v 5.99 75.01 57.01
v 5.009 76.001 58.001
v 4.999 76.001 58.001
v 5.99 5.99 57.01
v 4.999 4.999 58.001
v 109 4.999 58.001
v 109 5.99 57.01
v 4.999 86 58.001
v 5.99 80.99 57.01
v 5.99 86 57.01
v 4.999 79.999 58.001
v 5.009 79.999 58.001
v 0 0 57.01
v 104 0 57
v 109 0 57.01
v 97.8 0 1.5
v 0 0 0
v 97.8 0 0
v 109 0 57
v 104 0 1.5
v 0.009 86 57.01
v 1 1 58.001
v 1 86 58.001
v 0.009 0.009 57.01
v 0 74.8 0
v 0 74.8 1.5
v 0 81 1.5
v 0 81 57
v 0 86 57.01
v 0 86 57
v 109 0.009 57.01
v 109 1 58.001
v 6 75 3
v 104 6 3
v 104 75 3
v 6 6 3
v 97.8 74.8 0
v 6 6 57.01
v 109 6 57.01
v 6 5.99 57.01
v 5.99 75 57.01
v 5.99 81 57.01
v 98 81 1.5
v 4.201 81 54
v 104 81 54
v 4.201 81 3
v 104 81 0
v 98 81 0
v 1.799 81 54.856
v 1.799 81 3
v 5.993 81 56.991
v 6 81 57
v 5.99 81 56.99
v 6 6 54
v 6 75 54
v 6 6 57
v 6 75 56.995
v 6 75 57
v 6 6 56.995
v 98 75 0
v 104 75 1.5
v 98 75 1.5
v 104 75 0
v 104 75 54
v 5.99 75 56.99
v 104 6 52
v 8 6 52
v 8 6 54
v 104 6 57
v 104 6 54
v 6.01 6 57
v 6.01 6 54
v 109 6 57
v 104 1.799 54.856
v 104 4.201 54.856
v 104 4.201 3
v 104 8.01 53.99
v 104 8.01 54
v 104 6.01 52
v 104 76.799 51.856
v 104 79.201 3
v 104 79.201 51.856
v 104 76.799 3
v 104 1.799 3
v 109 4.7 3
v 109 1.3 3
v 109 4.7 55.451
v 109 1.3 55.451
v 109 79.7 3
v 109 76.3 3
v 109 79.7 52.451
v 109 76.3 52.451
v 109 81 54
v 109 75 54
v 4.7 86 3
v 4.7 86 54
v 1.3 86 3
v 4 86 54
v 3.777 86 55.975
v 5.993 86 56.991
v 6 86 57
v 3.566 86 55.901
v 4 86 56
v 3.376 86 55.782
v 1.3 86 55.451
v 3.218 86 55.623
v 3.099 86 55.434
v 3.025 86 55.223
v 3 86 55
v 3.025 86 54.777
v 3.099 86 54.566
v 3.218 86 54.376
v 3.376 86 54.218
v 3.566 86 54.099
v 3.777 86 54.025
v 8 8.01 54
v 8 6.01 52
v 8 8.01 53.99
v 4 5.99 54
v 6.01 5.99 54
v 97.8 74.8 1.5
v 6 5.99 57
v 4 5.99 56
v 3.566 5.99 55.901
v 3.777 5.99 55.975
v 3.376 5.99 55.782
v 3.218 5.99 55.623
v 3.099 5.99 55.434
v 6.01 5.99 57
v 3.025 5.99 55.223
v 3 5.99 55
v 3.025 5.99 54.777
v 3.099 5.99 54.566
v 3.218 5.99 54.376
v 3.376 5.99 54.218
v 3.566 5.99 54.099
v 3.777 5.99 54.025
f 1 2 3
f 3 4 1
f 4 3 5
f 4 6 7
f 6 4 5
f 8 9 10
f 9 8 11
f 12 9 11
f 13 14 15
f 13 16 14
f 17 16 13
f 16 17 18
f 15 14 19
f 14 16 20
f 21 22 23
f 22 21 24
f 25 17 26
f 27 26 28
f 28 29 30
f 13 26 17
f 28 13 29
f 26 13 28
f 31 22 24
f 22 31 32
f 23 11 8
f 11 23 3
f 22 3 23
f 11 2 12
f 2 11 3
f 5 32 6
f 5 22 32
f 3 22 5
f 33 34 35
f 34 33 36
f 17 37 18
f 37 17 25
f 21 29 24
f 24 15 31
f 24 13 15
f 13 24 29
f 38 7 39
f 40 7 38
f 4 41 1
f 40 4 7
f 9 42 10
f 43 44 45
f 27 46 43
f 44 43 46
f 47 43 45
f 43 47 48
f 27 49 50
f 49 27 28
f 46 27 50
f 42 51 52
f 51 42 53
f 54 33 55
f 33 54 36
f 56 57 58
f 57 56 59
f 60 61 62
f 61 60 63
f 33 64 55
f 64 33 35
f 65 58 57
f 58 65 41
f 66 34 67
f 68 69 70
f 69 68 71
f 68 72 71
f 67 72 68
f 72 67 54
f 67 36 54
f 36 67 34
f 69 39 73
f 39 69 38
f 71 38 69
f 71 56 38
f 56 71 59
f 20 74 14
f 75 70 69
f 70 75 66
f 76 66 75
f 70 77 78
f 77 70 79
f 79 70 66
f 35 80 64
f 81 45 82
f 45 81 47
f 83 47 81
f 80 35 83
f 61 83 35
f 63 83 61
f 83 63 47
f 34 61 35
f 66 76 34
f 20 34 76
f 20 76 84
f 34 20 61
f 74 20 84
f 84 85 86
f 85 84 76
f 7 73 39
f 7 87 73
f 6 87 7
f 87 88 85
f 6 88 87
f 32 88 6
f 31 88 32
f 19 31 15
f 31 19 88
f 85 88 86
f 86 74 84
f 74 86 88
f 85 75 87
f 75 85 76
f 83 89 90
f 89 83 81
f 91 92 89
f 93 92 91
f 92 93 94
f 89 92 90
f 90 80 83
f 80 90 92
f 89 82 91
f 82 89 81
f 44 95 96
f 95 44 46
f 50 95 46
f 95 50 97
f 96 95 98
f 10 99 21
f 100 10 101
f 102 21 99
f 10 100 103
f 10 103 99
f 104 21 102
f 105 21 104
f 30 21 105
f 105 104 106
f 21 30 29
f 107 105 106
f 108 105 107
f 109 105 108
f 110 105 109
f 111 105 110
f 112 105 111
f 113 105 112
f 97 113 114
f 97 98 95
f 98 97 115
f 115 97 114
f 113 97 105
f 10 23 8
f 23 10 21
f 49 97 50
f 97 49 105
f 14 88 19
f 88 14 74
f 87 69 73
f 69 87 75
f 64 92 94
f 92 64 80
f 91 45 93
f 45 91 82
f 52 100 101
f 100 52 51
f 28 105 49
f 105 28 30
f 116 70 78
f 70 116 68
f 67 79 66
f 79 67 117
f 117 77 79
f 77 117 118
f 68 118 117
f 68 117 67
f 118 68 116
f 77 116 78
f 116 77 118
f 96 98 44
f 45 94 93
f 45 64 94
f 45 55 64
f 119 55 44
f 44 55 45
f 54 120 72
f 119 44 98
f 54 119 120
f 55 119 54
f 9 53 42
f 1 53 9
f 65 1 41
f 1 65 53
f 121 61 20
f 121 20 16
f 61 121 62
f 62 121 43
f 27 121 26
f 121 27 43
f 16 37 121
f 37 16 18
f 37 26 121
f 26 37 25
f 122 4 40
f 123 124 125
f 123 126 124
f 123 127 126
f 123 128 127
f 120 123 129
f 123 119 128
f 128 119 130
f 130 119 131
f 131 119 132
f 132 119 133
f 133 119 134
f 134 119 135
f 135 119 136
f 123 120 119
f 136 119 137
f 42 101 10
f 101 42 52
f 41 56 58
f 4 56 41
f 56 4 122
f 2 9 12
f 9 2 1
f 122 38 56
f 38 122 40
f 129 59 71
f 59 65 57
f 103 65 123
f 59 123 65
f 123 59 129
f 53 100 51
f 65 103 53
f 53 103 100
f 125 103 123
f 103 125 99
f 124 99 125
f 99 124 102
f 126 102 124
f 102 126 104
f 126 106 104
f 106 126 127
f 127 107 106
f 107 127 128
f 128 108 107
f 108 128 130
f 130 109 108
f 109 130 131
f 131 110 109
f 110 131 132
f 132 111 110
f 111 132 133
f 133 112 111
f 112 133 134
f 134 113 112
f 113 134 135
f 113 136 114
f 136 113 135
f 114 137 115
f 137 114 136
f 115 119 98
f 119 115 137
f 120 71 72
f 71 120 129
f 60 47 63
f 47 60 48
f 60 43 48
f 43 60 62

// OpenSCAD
// ============================================================================
// cutlery_box.scad
// Graduated 3-chamber disposable-cutlery box (Option 3) — CUT-FROM-SOLID port
// of build_box.py, for a 120 x 120 x 120 mm printer (AOSEED).
//
// WHY THIS PORT EXISTS (the whole point):
//   The hand-mesh generator (build_box.py) could not keep the 1 mm rim chamfer
//   continuous across the female dovetail joints, because where a slot's flared
//   corner crosses the sloped chamfer it needs a true boolean intersection.
//   OpenSCAD HAS that boolean kernel, so here we do exactly the "cut-from-solid"
//   thing:
//      1. Build the ENTIRE box as ONE solid, WITH the chamfer already on it.
//      2. difference() out vertical dovetail prisms ( /_\ cross-section ),
//         running from just above the base plate up THROUGH the rim, to both
//         (a) form the sliding-dovetail joints, and
//         (b) split the box into 6 bed-sized pieces.
//   Because the cut is a real boolean through the already-chamfered solid, the
//   sloped chamfer<->slot edge is produced for free => the rim chamfer stays
//   CONTINUOUS across every joint, with none of the sliver hacks.
//
// ----------------------------------------------------------------------------
// HOW TO USE
//   In the app:  set `part` below (or use the Customizer dropdown), F5 to
//                preview, F6 to render, then File > Export > STL.
//   One piece (CLI):
//      openscad -o body_knife_A.stl -D 'part="knife_A"' cutlery_box.scad
//   ALL SIX (bash, run from this folder):
//      for p in knife_A knife_B fork_A fork_B spoon_A spoon_B; do \
//        openscad -o "body_$p.stl" -D "part=\"$p\"" cutlery_box.scad ; done
//   PNG preview of one piece:
//      openscad -o knife_B.png --imgsize=1400,1000 --autocenter --viewall \
//        -D 'part="knife_B"' cutlery_box.scad
//
//   Pieces are modelled in ASSEMBLED coordinates (floor-down, z=0 is the bed),
//   so importing all six STLs together shows the assembled box directly; your
//   slicer will auto-drop each one onto the plate for printing.
//
// BED SANITY: every piece is <= 120 mm in X, Y, Z.
//   Z = 58 mm. Widest piece = spoon at 117 mm (Y). A-halves reach 109 mm (X,
//   including the protruding dovetail key). All under 120.
//
// !! I could NOT run OpenSCAD to verify this file (no binary in my sandbox) !!
//   - The rim chamfer is a SMOOTH, true-45 bevel built from hull() frustums of
//     convex rectangles. Works in every OpenSCAD since ~2015 (incl. Homebrew
//     2021.01). No stepped staircase -- and, crucially, it makes box() a clean
//     well-formed solid so the per-part booleans resolve reliably (the old
//     14-slice staircase was fragile and CGAL was dropping the walls of the
//     interior parts, leaving only the key prisms => "floating boxes").
//   - roof() is still available behind USE_ROOF=true for those who have it
//     (2021.01+ snapshots); for THIS rectangular design it is identical, so it
//     is NOT required.
//   - After F6, check the console for "WARNING"/"not a valid 2-manifold".
//     If a tenon ever looks detached, bump EPS to 0.05.
// ============================================================================


/* [Part to render / export] */
part = "knife_A"; // [knife_A, knife_B, fork_A, fork_B, spoon_A, spoon_B, assembly]

/* [Chamfer method] */
// false = smooth hull() frustum bevel (default, any OpenSCAD); true = roof() (2021.01+)
USE_ROOF = false;

/* [Heights (mm)] */
BASE   = 3.0;     // floor / base-plate thickness
COMP_H = 55.0;    // interior wall height above the floor (cutlery stack depth)

/* [Walls (mm)] */
HOST_T   = 6.0;     // thickness of every wall (thick enough to host a dovetail)
HALF_LEN = 104.0;   // printed length of each half (A = near, B = far); <120 incl. key

/* [Chamber bays (mm)] */
N_COL     = 3;       // columns of cutlery per chamber
KNIFE_COL = 23.0;    // -> knife bay 69  (3 x 19 mm knives + play)
FORK_COL  = 33.0;    // -> fork  bay 99  (3 x 29 mm forks  + play)
SPOON_COL = 37.0;    // -> spoon bay 111 (3 x 34 mm spoons + play, trimmed <120)

/* [Dovetail joint (mm)] */
// TRIAL-PRINT FIX (Option A): the first print left the FEMALE ears only
//   ear = HOST_T/2 - (DT_FLARE + DT_CLR) = 3 - (2.1 + 0.4) = 0.5 mm  -> floppy,
//   the tail wiggled out, and the 0.5 mm outer skin showed the joint from outside.
// We CANNOT thicken the wall past 6 mm (no inner boss), so instead we shrink the
//   tail and spend the generous slide play to DOUBLE the ears, staying inside 6 mm:
//   ear = HOST_T/2 - (DT_FLARE + DT_CLR) = 3 - (1.7 + 0.3) = 1.0 mm.
//   Cost: shallower undercut hook (DT_FLARE-DT_NECK) 0.9 -> 0.5 mm. Acceptable for a
//   VERTICAL sliding dovetail (hold comes mostly from the 55 mm slide length + snug
//   fit, not a deep hook). Male tail neck (DT_NECK) is UNCHANGED, so the male keeps
//   its strength.
DT_DEPTH = 5.0;   // tail protrusion past the seam (male key depth)
DT_NECK  = 1.2;   // half-width at the seam face (narrow)   [Option A: unchanged]
DT_FLARE = 1.7;   // half-width at the tip (wide -> locks)  [Option A: was 2.1]
DT_CLR   = 0.3;   // FLANK/seam slide clearance added to the female socket [Option A: was 0.4]
DT_DEPTH_RELIEF = 0.3; // extra depth on the socket BACK only, so the tail tip never bottoms out
// ---- FUTURE TRIAL — Option B (thicker ears still: 1.2 mm) -------------------------
// If Option A's ears still feel thin, try Option B. It buys another 0.2 mm of ear by
// also narrowing the MALE neck (so the male gets a little weaker — that's the trade):
//     DT_NECK  = 1.0;   // was 1.2  (male neck 2.4 -> 2.0 mm full width)
//     DT_FLARE = 1.5;   // was 2.1
//     DT_CLR   = 0.3;   // same as Option A
//   -> ear = 3 - (1.5 + 0.3) = 1.2 mm ; undercut hook = 1.5 - 1.0 = 0.5 mm (same as A).
// Only switch ONE option in at a time; re-test the knife pair before committing all six.
// ----------------------------------------------------------------------------------

/* [Hidden-dovetail top cap / "hat" (mm)] */
// The dovetail otherwise shows its trapezoid outline on the TOP edge of the wall.
// To hide it, the MALE piece extends the wall's full-width top (chamfer included)
// across the key footprint -> a flush, continuous top. The FEMALE piece gets a
// matching top RECESS (cap footprint + CAP_CLR) so the cap drops straight in.
// Result: the top reads as one surface with a single straight seam line at the cap
// tip; the dovetail joinery lives entirely below the cap.
//
// SELF-SUPPORTING UNDERSIDE: the cap reaches the FULL wall width at the chamfer base
// (so the top edge reads as the wall extended, with NO recessed sliver on the outer
// face), and its underside is ONE planar ramp from the chamfer's OUTER CORNER
// (half-width HOST_T/2 at z = BODY_H-CHAMFER) down to the dovetail-neck half-width
// (CAP_FOOT) at CAP_SLANT_DEG from horizontal. No little horizontal step. The ramp
// reaching full width exactly at the chamfer base means "ramp top" == "chamfer base"
// (CAP_H is DERIVED). The FEMALE recess is the same ramp + CAP_CLR play.
// TRADEOFF: because the cap runs all the way to the outer corner, the female wall
// tapers to ~0 at z = BODY_H-CHAMFER -> a thin feather edge at the joint (gradual at
// CAP_SLANT_DEG, hidden inside the joint when assembled). Accepted per design intent.
CAP_SLANT_DEG = 50;     // cap underside ramp angle from horizontal (50 = self-supporting, long flare)
CAP_FOOT = DT_NECK;     // cap-underside half-width where it meets the dovetail neck
CAP_CLR = 0.3;          // slide clearance so the male cap seats into the female top recess

/* [Rim chamfer (mm)] */
CHAMFER = 1.0;    // 45-deg comfort break broken along the top wall edges

/* [Base half-lap / anti-warp (mm)] */
// Neighbouring base plates overlap as a HORIZONTAL half-lap (shiplap) at mid-base
// height, so corners stay coplanar (no lift/protrusion). Horizontal lap faces do
// NOT bind the vertical-drop assembly. Shingle direction: A->B and knife->fork->spoon.
LAP_LEN = 6;        // overlap past the A/B seam and the knife/fork seam
LAP_LEN_FS = 2;     // overlap past the fork/SPOON seam -- SMALLER: spoon is the
                    // tightest piece (117mm of the 120mm bed); a 6mm lap there
                    // would push spoon to 123mm. 2mm keeps spoon at 119mm.
LAP_Z   = BASE/2;   // 1.5 -- horizontal split height of the lap (bottom vs top half)
LAP_CLR = 0.2;      // in-plane clearance so the shelf isn't a press fit

/* [Lid — box features that receive a flat ORDERED clear sheet] */
// The lid itself is NOT printed: it's a flat ~2 mm PETG/Tritan sheet, bullnose-polished
// edges (r=LID_EDGE_R), ordered to size. We only model the box features that receive it.
LID_T            = 2.0;   // ordered sheet thickness
LID_EDGE_R       = 1.0;   // ordered sheet bullnose edge radius (for the sheet order spec)
LID_PLAY         = 0.4;   // total vertical play in the hinge groove (sheet + this)
LID_RECESS       = 2.0;   // lid TOP sits this far BELOW the rim, so the journal pocket is fully
                          // capped (rim caps the bullnose -> retains the lid when raised; tilt-in)
HINGE_AT_MINUS_X = true;  // hinge on the -x (303mm) end wall; clip on +x. (flip = mirror; default delivered)
// perimeter support ledge (lid underside rests on it at z = BODY_H-LID_T)
LEDGE_W          = 2.0;   // ledge inward protrusion (its underside ramps back at 45 deg -> self-supporting)
GROOVE_END_INSET = 0.0;   // groove reaches the corners but RUNS OUT smoothly there (no end-face / no
                          // exposed bore); GROOVE_TAPER sets the run-out length
GROOVE_TAPER     = 4.0;   // y-length over which the eased mouth tapers out at each groove end
// hinge journal (cut into the inner face of the hinge end wall, CONTINUOUS along the long edge)
GROOVE_DEPTH     = 3.0;   // 2mm lead-in slot + 1mm pocket radius -> journal sits 2mm back from the
                          // face so its cap clears the swing relief and RETAINS the lid
GROOVE_POCKET_R  = 1.0;   // journal half-cylinder radius (the bullnose sheet edge rolls in it)
// clip latch — TWO light DETENT clips on the clip end wall, flanking a central finger notch.
// "Light detent" = small overhang so the rigid sheet pops past it by hand (not a firm lock).
CLIP_W           = 8.0;   // width of EACH of the two clips
CLIP_LIP         = 0.3;   // retaining overhang (light detent; 0.3 soft .. 0.6 firm-but-stiff)
CLIP_RAMP_H      = 1.6;   // cam-ramp height (press-to-close lead-in)
// finger notch — a through-cut in the clip wall (visible from outside), centered between the
// two clips, so a fingertip can reach the lid edge and lift it (popping both clips at once).
NOTCH_W          = 20.0;  // finger-notch width
NOTCH_DEPTH      = 6.0;   // how far down from the rim to the deepest point (past the lid edge)
NOTCH_ARCH       = 4.0;   // bottom is an ELLIPTICAL arch this tall; the rest is vertical sides
                          // (NOTCH_ARCH < NOTCH_W/2 -> a gentle arch, not a deep half-circle)


/* [Hidden] */
EPS      = 0.01;          // tiny overlap so abutting solids fuse cleanly in CGAL
// Upper-chamber pieces (fork, spoon) were cut by a cell plane laid EXACTLY on the
// divider wall's far face (the lower chamber owns that wall). intersection() along a
// plane coincident with an existing box face makes CGAL leave a ZERO-THICKNESS copy
// of the wall face -> edge-manifold + "watertight" but degenerate (OpenSCAD shows it
// as a blue back-face; Tinkercad thickens it into a phantom block). SEAM_EPS nudges
// those cut planes a hair INTO the open bay so they no longer coincide with any box
// face -> no flap. 0.02 mm is physically nothing but is well clear of CGAL's tolerance.
SEAM_EPS = 0.02;
CUT_OVER = 1.0;           // how far dovetail cutters overshoot the rim (clean cut)

BODY_H    = BASE + COMP_H;     // 58  total height
END_WALL  = HOST_T;            // end walls are dovetail hosts too -> equally thick
TOTAL_LEN = 2 * HALF_LEN;      // 208 assembled length (end wall .. end wall)

// hidden-cap ramp geometry (derived).
//   CAP_HW    = cap MAX half-width = HOST_T/2 (the full wall edge) at the chamfer base.
//   CAP_RISE  = vertical height of the self-supporting CAP_SLANT_DEG underside ramp.
//   CAP_ZRAMP = where the cap reaches full width = the chamfer base (BODY_H-CHAMFER), so
//               the ramp runs straight to the chamfer OUTER CORNER (no horizontal step).
//   CAP_ZBOT  = cap bottom = ramp start; CAP_H derived from it (for reference/report).
//   CAP_ZRAMP_R = recess ramp top, shifted down by CAP_CLR so the recess ramp stays
//               parallel to the cap ramp with uniform play.
CAP_HW      = HOST_T/2;   // cap reaches the FULL wall edge at the chamfer base
CAP_RISE    = (CAP_HW - CAP_FOOT) * tan(CAP_SLANT_DEG);
CAP_ZRAMP   = BODY_H - CHAMFER;               // full width exactly at the chamfer base / outer corner
CAP_ZBOT    = CAP_ZRAMP - CAP_RISE;
CAP_H       = BODY_H - CAP_ZBOT;              // derived; reported
CAP_ZRAMP_R = CAP_ZRAMP;   // recess ramp ALSO tops at the chamfer corner (mirror the cap) -> no vertical lip
// sanity checks
assert(CAP_ZBOT > BASE + 1,
       "cap zone dips too low -- raise CAP_SLANT_DEG");
assert(CAP_HW >= DT_FLARE,
       "cap too narrow to cover the dovetail tail");

// NOTE: lid-derived constants are defined BELOW the Y-layout block, because some of
// them (INTERIOR_Y0/Y1, CLIP_CY) depend on OUTER_L / OUTER_R / EXT_W. See "lid derived".

// bay widths
KNIFE_BAY = N_COL * KNIFE_COL; // 69
FORK_BAY  = N_COL * FORK_COL;  // 99
SPOON_BAY = N_COL * SPOON_COL; // 111

// ---- Y layout (width direction): wall | bay | divider | bay | divider | bay | wall
KNIFE_Y0 = 0;
KNIFE_Y1 = HOST_T + KNIFE_BAY + HOST_T;        // 0..81   (outer wall + bay + divider)
FORK_Y0  = KNIFE_Y1;                           // 81
FORK_Y1  = FORK_Y0 + FORK_BAY + HOST_T;        // 81..186 (bay + divider)
SPOON_Y0 = FORK_Y1;                            // 186
SPOON_Y1 = SPOON_Y0 + SPOON_BAY + HOST_T;      // 186..303(bay + outer wall)
EXT_W    = SPOON_Y1;                           // 303 total width

// lengthwise wall Y-bands [y0,y1] (host the A/B dovetails) + their centers
OUTER_L  = [0, HOST_T];                                       // [0,6]    c=3
DIV_KF   = [HOST_T + KNIFE_BAY, HOST_T + KNIFE_BAY + HOST_T]; // [75,81]  c=78
DIV_FS   = [FORK_Y0 + FORK_BAY, FORK_Y0 + FORK_BAY + HOST_T]; // [180,186]c=183
OUTER_R  = [SPOON_Y1 - HOST_T, SPOON_Y1];                     // [297,303]c=300

// ---- lid derived ---- (placed AFTER OUTER_L/OUTER_R/EXT_W so nothing is forward-referenced)
LID_TOP_Z   = BODY_H - LID_RECESS;        // 56  lid TOP (recessed); rim z=58 rises LID_RECESS above it
LID_Z_UNDER = LID_TOP_Z - LID_T;          // 54  lid underside / ledge top / lowered-divider top
POCKET_CZ   = LID_TOP_Z - LID_T/2;        // 55  journal centre (lid mid) -> pocket top = LID_TOP_Z = capped
// hinge end-wall inner face x + inward direction; clip end-wall inner face x + inward dir
HINGE_INX   = HINGE_AT_MINUS_X ? END_WALL : TOTAL_LEN - END_WALL;       // 6  (default)
HINGE_IN    = HINGE_AT_MINUS_X ? 1 : -1;  // interior direction from the hinge wall (+x default)
CLIP_INX    = HINGE_AT_MINUS_X ? TOTAL_LEN - END_WALL : END_WALL;       // 202 (default)
CLIP_IN     = HINGE_AT_MINUS_X ? -1 : 1;  // interior direction from the clip wall (-x default)
POCKET_CX   = HINGE_INX - HINGE_IN*(GROOVE_DEPTH - GROOVE_POCKET_R);    // 5  pocket centre x (INTO the wall)
INTERIOR_Y0 = OUTER_L[1];                 // 6   inner face of the -y short wall
INTERIOR_Y1 = OUTER_R[0];                 // 297 inner face of the +y short wall
CLIP_CY     = EXT_W/2;                     // 151.5 clip/scallop centre (in the fork chamber)
assert(POCKET_CZ - GROOVE_POCKET_R > BASE + 1,
       "journal dips too low -- reduce LID_RECESS or LID_T");
assert(POCKET_CZ + GROOVE_POCKET_R <= LID_TOP_Z + EPS,
       "journal not capped -- lower the lid (raise LID_RECESS) or shrink GROOVE_POCKET_R");
// NOTE: with LID_RECESS the lid underside (and lowered dividers) sit BELOW CAP_ZBOT. That is
// intended: the inner dividers are cut flat below the cap zone (their hidden caps are removed,
// but the lid covers them); the perimeter/end-wall caps are untouched (full-height walls).

// the three OPEN bays are rectangular holes in the wall footprint:
//   footprint = outer rectangle MINUS these bays  (== the 6 walls; verified).
// The smooth chamfer is built from exactly this decomposition.
BAY_X0 = END_WALL;              // 6
BAY_X1 = TOTAL_LEN - END_WALL;  // 202
BAYS = [
    [BAY_X0, BAY_X1, HOST_T,   HOST_T + KNIFE_BAY],   // knife bay [6,202] x [6,75]
    [BAY_X0, BAY_X1, FORK_Y0,  FORK_Y0 + FORK_BAY],   // fork  bay [6,202] x [81,180]
    [BAY_X0, BAY_X1, SPOON_Y0, SPOON_Y0 + SPOON_BAY], // spoon bay [6,202] x [186,297]
];

YC_OUTL  = OUTER_L[0] + HOST_T/2;   // 3   outer-left wall center
YC_DIVKF = DIV_KF[0]  + HOST_T/2;   // 78  knife/fork divider center
YC_DIVFS = DIV_FS[0]  + HOST_T/2;   // 183 fork/spoon divider center
YC_OUTR  = OUTER_R[0] + HOST_T/2;   // 300 outer-right wall center

// seams
AB_SEAM = HALF_LEN;               // 104  A/B length seam (x)
SEAM_KF = FORK_Y0;                // 81   knife/fork width seam (y)
SEAM_FS = SPOON_Y0;              // 186  fork/spoon width seam (y)
ENDC_A  = END_WALL/2;             // 3    A end-wall center (x) -> chamber dovetails
ENDC_B  = TOTAL_LEN - END_WALL/2; // 205  B end-wall center (x)


// ============================================================================
// 2D wall footprint (cross-section of all walls, constant in z for the straight
// part). Union of: 2 full-width end walls + 4 lengthwise walls between them.
// ============================================================================
module wall_footprint_2d() {
    // footprint = outer rectangle minus the 3 open bays  (== the 6 walls)
    difference() {
        square([TOTAL_LEN, EXT_W]);
        for (b = BAYS) translate([b[0], b[2]]) square([b[1] - b[0], b[3] - b[2]]);
    }
}

// ============================================================================
// The full chamfered box solid = base plate + walls with a continuous 1 mm
// top-rim chamfer. Built ONCE; every piece is carved out of this.
// ============================================================================
module chamfer_cap() {
    // SMOOTH 45 rim chamfer over z[BODY_H-CHAMFER, BODY_H], in absolute coords.
    zm = BODY_H - CHAMFER;
    if (USE_ROOF) {
        // exact straight-skeleton roof, capped at CHAMFER height (needs roof()).
        intersection() {
            translate([0,0,zm]) roof() wall_footprint_2d();
            translate([0,0,zm]) linear_extrude(CHAMFER + EPS) wall_footprint_2d();
        }
    } else {
        // DEFAULT: true 45 bevel as hull() frustums of CONVEX rectangles -> smooth
        // AND a clean manifold.  Since footprint = outer - bays, the chamfer of the
        // footprint = (outer rectangle beveled inward) MINUS (each bay beveled so it
        // grows toward the top, which bevels every bay-facing rim).  All hull()s are
        // on convex rectangles, so nothing gets convex-filled.
        difference() {
            // outer perimeter frustum: full outer rect at zm -> inset by CHAMFER at top
            hull() {
                translate([0,0,zm])     linear_extrude(0.001) square([TOTAL_LEN, EXT_W]);
                translate([0,0,BODY_H]) linear_extrude(0.001) offset(delta=-CHAMFER) square([TOTAL_LEN, EXT_W]);
            }
            // each bay grows by CHAMFER toward the top -> bevels its surrounding rim.
            // (overshoots z a hair past both ends so the cut is clean.)
            for (b = BAYS)
                hull() {
                    translate([0,0,zm-EPS])     linear_extrude(0.001)
                        translate([b[0],b[2]]) offset(delta=-EPS)        square([b[1]-b[0], b[3]-b[2]]);
                    translate([0,0,BODY_H+EPS]) linear_extrude(0.001)
                        translate([b[0],b[2]]) offset(delta=CHAMFER+EPS) square([b[1]-b[0], b[3]-b[2]]);
                }
        }
    }
}

module box() {
    zm = BODY_H - CHAMFER;
    union() {
        cube([TOTAL_LEN, EXT_W, BASE]);                                        // base plate z[0,3]
        translate([0,0,BASE]) linear_extrude(zm - BASE + EPS) wall_footprint_2d(); // straight walls z[3,57]
        chamfer_cap();                                                         // smooth chamfer z[57,58]
    }
}

// ============================================================================
// Dovetail prisms ( /_\ ). Vertical, z[BASE, BODY_H+CUT_OVER] so they cut
// through the rim but leave the base plate continuous. The near face is pushed
// back EPS so a male key always fuses to its wall.
//   male key   : half_n=DT_NECK,         half_f=DT_FLARE
//   female slot: half_n=DT_NECK+DT_CLR,  half_f=DT_FLARE+DT_CLR
// ============================================================================
module dt_prism_X(seam_x, yc, half_n, half_f) {   // perpendicular to X, grows +X
    translate([0,0,BASE]) linear_extrude(BODY_H - BASE + CUT_OVER)
        polygon([[seam_x - EPS,        yc - half_n],
                 [seam_x + DT_DEPTH,   yc - half_f],
                 [seam_x + DT_DEPTH,   yc + half_f],
                 [seam_x - EPS,        yc + half_n]]);
}
module dt_prism_Y(seam_y, xc, half_n, half_f) {   // perpendicular to Y, grows +Y
    translate([0,0,BASE]) linear_extrude(BODY_H - BASE + CUT_OVER)
        polygon([[xc - half_n, seam_y - EPS],
                 [xc - half_f, seam_y + DT_DEPTH],
                 [xc + half_f, seam_y + DT_DEPTH],
                 [xc + half_n, seam_y - EPS]]);
}
module ab_key   (yc)        { dt_prism_X(AB_SEAM, yc, DT_NECK, DT_FLARE); }
module ch_key   (seam_y, xc){ dt_prism_Y(seam_y, xc, DT_NECK, DT_FLARE); }

// Female sockets = male + DT_CLR on the flanks/seam (unchanged), PLUS a straight
// back-face relief of DT_DEPTH_RELIEF so the tail tip never bottoms out. The
// relief is a rectangle tacked onto the trapezoid's tip at the SAME flare width,
// so the angled flank faces (and their 0.4 mm slide clearance) are untouched.
module ab_socket(yc) {
    dt_prism_X(AB_SEAM, yc, DT_NECK + DT_CLR, DT_FLARE + DT_CLR);
    translate([0,0,BASE]) linear_extrude(BODY_H - BASE + CUT_OVER)
        translate([AB_SEAM + DT_DEPTH, yc - (DT_FLARE + DT_CLR)])
            square([DT_DEPTH_RELIEF, 2*(DT_FLARE + DT_CLR)]);          // back relief, +X
}
module ch_socket(seam_y, xc) {
    dt_prism_Y(seam_y, xc, DT_NECK + DT_CLR, DT_FLARE + DT_CLR);
    translate([0,0,BASE]) linear_extrude(BODY_H - BASE + CUT_OVER)
        translate([xc - (DT_FLARE + DT_CLR), seam_y + DT_DEPTH])
            square([2*(DT_FLARE + DT_CLR), DT_DEPTH_RELIEF]);          // back relief, +Y
}

// ===== hidden-dovetail top cap ("hat"), SELF-SUPPORTING underside ===============
// MALE cap: a FULL-wall-width hat whose underside is ONE planar ramp from the chamfer's
// OUTER CORNER (half-width CAP_HW = HOST_T/2 at CAP_ZRAMP = BODY_H-CHAMFER) down to the
// dovetail-neck half-width (CAP_FOOT) at CAP_SLANT_DEG from horizontal -> the self-
// supporting shoulder, running straight to the corner (no horizontal step). Built as
// hull(narrow bottom slab buried in the tail neck, full-width top slab through the rim);
// box() trims it to the wall and adds the continuous rim chamfer for free, so the outer
// top edge reads as the wall extended (no recessed sliver). The protruding NOSE is left
// SQUARE (vertical) -- hidden in the female socket when assembled.
// TRADEOFF: the female wall tapers to ~0 at z=BODY_H-CHAMFER (a thin feather edge at the
// joint, gradual at CAP_SLANT_DEG) -- accepted per design intent.
module ab_cap(yc) {   // A/B seam, grows +X past the seam (length direction)
    hull() {
        translate([AB_SEAM - EPS, yc - CAP_FOOT, CAP_ZBOT])
            cube([DT_DEPTH + EPS, 2*CAP_FOOT, EPS]);
        translate([AB_SEAM - EPS, yc - CAP_HW,   CAP_ZRAMP])
            cube([DT_DEPTH + EPS, 2*CAP_HW, (BODY_H + CUT_OVER) - CAP_ZRAMP]);
    }
}
module ch_cap(seam_y, xc) {   // chamber seam, grows +Y past the seam (in the end wall)
    hull() {
        translate([xc - CAP_FOOT, seam_y - EPS, CAP_ZBOT])
            cube([2*CAP_FOOT, DT_DEPTH + EPS, EPS]);
        translate([xc - CAP_HW,   seam_y - EPS, CAP_ZRAMP])
            cube([2*CAP_HW, DT_DEPTH + EPS, (BODY_H + CUT_OVER) - CAP_ZRAMP]);
    }
}
// FEMALE recess: the SAME ramp grown by CAP_CLR (flanks, tip, floor, and ramp shifted down
// by CAP_CLR so it stays parallel) -> the cap seats with uniform slide clearance. It opens
// to the wall edge (and a hair past, into air) so the cap's full-width corner drops in;
// this is what leaves the thin female feather at the top (accepted). Open upward + toward seam.
module ab_cap_neg(yc) {
    hull() {
        translate([AB_SEAM - EPS, yc - (CAP_FOOT + CAP_CLR), CAP_ZBOT - CAP_CLR])
            cube([DT_DEPTH + CAP_CLR + EPS, 2*(CAP_FOOT + CAP_CLR), EPS]);
        translate([AB_SEAM - EPS, yc - (CAP_HW + EPS), CAP_ZRAMP_R])
            cube([DT_DEPTH + CAP_CLR + EPS, 2*(CAP_HW + EPS), (BODY_H + CUT_OVER + 1) - CAP_ZRAMP_R]);
    }
}
module ch_cap_neg(seam_y, xc) {
    hull() {
        translate([xc - (CAP_FOOT + CAP_CLR), seam_y - EPS, CAP_ZBOT - CAP_CLR])
            cube([2*(CAP_FOOT + CAP_CLR), DT_DEPTH + CAP_CLR + EPS, EPS]);
        translate([xc - (CAP_HW + EPS), seam_y - EPS, CAP_ZRAMP_R])
            cube([2*(CAP_HW + EPS), DT_DEPTH + CAP_CLR + EPS, (BODY_H + CUT_OVER + 1) - CAP_ZRAMP_R]);
    }
}
// LOWERED-DIVIDER hat: same 50-deg self-supporting cap as ab_cap, but reaching FULL width at the
// LOWERED divider top (LID_Z_UNDER) instead of the rim -- because the inner dividers are lowered
// for the lid, which strips their normal cap. It extends above the top and is trimmed flush to
// LID_Z_UNDER by divider_lower(), so the divider top reads as one surface (dovetail hidden below).
DCAP_ZRAMP = LID_Z_UNDER;            // full width at the lowered divider top (54)
DCAP_ZBOT  = DCAP_ZRAMP - CAP_RISE;  // ramp start (neck), 50 deg below
module div_cap(yc) {        // male hat on the lowered divider (A/B seam)
    hull() {
        translate([AB_SEAM - EPS, yc - CAP_FOOT, DCAP_ZBOT])
            cube([DT_DEPTH + EPS, 2*CAP_FOOT, EPS]);
        translate([AB_SEAM - EPS, yc - CAP_HW,   DCAP_ZRAMP])
            cube([DT_DEPTH + EPS, 2*CAP_HW, (BODY_H + CUT_OVER) - DCAP_ZRAMP]);
    }
}
module div_cap_neg(yc) {    // female recess to receive div_cap (with CAP_CLR slide play)
    hull() {
        translate([AB_SEAM - EPS, yc - (CAP_FOOT + CAP_CLR), DCAP_ZBOT - CAP_CLR])
            cube([DT_DEPTH + CAP_CLR + EPS, 2*(CAP_FOOT + CAP_CLR), EPS]);
        translate([AB_SEAM - EPS, yc - (CAP_HW + EPS), DCAP_ZRAMP])
            cube([DT_DEPTH + CAP_CLR + EPS, 2*(CAP_HW + EPS), (BODY_H + CUT_OVER + 1) - DCAP_ZRAMP]);
    }
}

// rectangular cell (x[xa,xb], y[ya,yb], full height + margin) used to split pieces
module cell(xa, xb, ya, yb) {
    translate([xa, ya, -1]) cube([xb - xa, yb - ya, BODY_H + 11]);
}

// ===== base half-lap (shiplap) =================================================
// HORIZONTAL lap at mid-base height: the shelf-owner keeps its BOTTOM half
// (z 0..LAP_Z) extending LAP_LEN past the seam; the neighbour has its bottom half
// REMOVED there (keeps only the top half) and lands flat on the shelf. Horizontal
// faces => no binding during the vertical drop. Shelves live entirely in the base
// (z < BASE), well clear of the wall dovetails (z >= BASE).
// Shingle = FEMALE-first (matches the no-notch dovetail assembly order, which
// lowers the male piece onto the female): the B half owns the A/B shelf (grows
// -X into A) and the UPPER chamber (fork, spoon) owns the chamber shelf (grows
// -Y into the lower chamber).  Order: spoon, fork, knife; B before A.
module lap_shelf_X(y0, y1) {                 // B-side shelf, grows -X into A past AB_SEAM
    // +EPS past AB_SEAM so the shelf interpenetrates (not just abuts) its own B body -> fuses cleanly.
    translate([AB_SEAM - LAP_LEN, y0, 0]) cube([LAP_LEN + EPS, y1 - y0, LAP_Z]);
}
module lap_neg_X(y0, y1) {                   // A-side: remove bottom half to receive it
    translate([AB_SEAM - LAP_LEN - LAP_CLR, y0 - EPS, -EPS])
        cube([LAP_LEN + LAP_CLR + EPS, (y1 - y0) + 2*EPS, LAP_Z + EPS]);
}
module lap_shelf_Y(seam_y, x0, x1, ln=LAP_LEN) {   // upper-chamber shelf, grows -Y into lower
    // grows -Y by `ln` into the lower chamber AND +Y by 2*SEAM_EPS past the seam so it
    // always overlaps the (SEAM_EPS-nudged) body floor and stays fused -> no floating shelf.
    translate([x0, seam_y - ln, 0]) cube([x1 - x0, ln + 2*SEAM_EPS, LAP_Z]);
}
module lap_neg_Y(seam_y, x0, x1, ln=LAP_LEN) {     // lower-chamber: remove bottom half
    translate([x0 - EPS, seam_y - ln - LAP_CLR, -EPS])
        cube([(x1 - x0) + 2*EPS, ln + LAP_CLR + EPS, LAP_Z + EPS]);
}

// ===== corner crossing key (TRIAL-PRINT FIX) ==================================
// At each A/B-seam x divider crossing the half-lap left a thin 1.5 mm dangling tab
// (the chamber shelf) with a floating lip above it. Instead we make a SOLID
// FULL-HEIGHT base corner on the DIVIDER-OWNING piece (so it sits right under that
// piece's own divider wall -> well anchored, no dangle, squared off), and CLIP the
// neighbour chamber shelf back by LAP_CLR so nothing collides. Added as a final
// union() AFTER the per-part cuts so the lap negatives don't eat it.
//   knife/fork divider -> boss on knife_A ; clip fork_A's SEAM_KF chamber shelf.
//   fork/spoon divider -> boss on fork_A  ; clip spoon_A's SEAM_FS chamber shelf.
// The boss spans x[seam-lap_x, seam] (the A side only) and the dangling y-strip; it
// overshoots z by EPS to fuse into the divider wall. B pieces are x>=seam -> untouched.
module corner_key(seam_x, lap_x, y0, y1) {
    translate([seam_x - lap_x, y0, 0]) cube([lap_x, y1 - y0, BASE + EPS]);
}
CORNER_CLIP = LAP_LEN + LAP_CLR;   // how far to pull a chamber shelf back from the A/B seam

// ============================================================================
// LID FEATURES (receive a flat ORDERED clear sheet; the sheet is not printed).
// All features live at the TOP (z >= ~52), ABOVE the dovetail engagement, the half-lap
// (z<1.5) and most of the hat, so the vertical-drop assembly and joints are untouched.
// EPS overlaps throughout; no coincident coplanar faces with the existing walls.
// Default orientation: HINGE on the -x end wall (A pieces), CLIP on the +x end wall
// (B pieces), clip+scallop centred on the fork (middle) chamber.
// ============================================================================

// --- perimeter support ledge: 45-deg self-supporting brackets; rest face at LID_Z_UNDER.
//     Runs along the CLIP end wall + the two short outer walls. (Hinge wall uses the groove.)
//     Built as hull(thin top edge, wall column) -> a triangular bracket whose underside is
//     a 45-deg ramp (prints floor-down with no support). ADDED to each piece (clipped by cell).
//     Each run is INSET by LEDGE_W from the perpendicular walls so the three brackets never
//     overlap at a corner and the wall's normal chamfer wraps every corner uninterrupted.
module lid_ledge() {
    cy0 = INTERIOR_Y0 + LEDGE_W;  cy1 = INTERIOR_Y1 - LEDGE_W;  cyl = cy1 - cy0;   // clip-run y span (inset)
    sx0 = END_WALL    + LEDGE_W;  sxl = (TOTAL_LEN - 2*END_WALL) - 2*LEDGE_W;       // short-run x span (inset)
    // clip end wall (x = CLIP_INX), bracket protrudes toward interior (CLIP_IN)
    hull() {
        translate([CLIP_INX + CLIP_IN*LEDGE_W, cy0, LID_Z_UNDER - EPS]) cube([EPS, cyl, EPS]);
        translate([CLIP_INX - EPS,             cy0, LID_Z_UNDER - LEDGE_W]) cube([2*EPS, cyl, LEDGE_W]);
    }
    // OUTER_L short wall (y = INTERIOR_Y0), bracket protrudes +y
    hull() {
        translate([sx0, INTERIOR_Y0 + LEDGE_W, LID_Z_UNDER - EPS]) cube([sxl, EPS, EPS]);
        translate([sx0, INTERIOR_Y0 - EPS,     LID_Z_UNDER - LEDGE_W]) cube([sxl, 2*EPS, LEDGE_W]);
    }
    // OUTER_R short wall (y = INTERIOR_Y1), bracket protrudes -y
    hull() {
        translate([sx0, INTERIOR_Y1 - LEDGE_W, LID_Z_UNDER - EPS]) cube([sxl, EPS, EPS]);
        translate([sx0, INTERIOR_Y1 - EPS,     LID_Z_UNDER - LEDGE_W]) cube([sxl, 2*EPS, LEDGE_W]);
    }
}

// --- hinge groove: ONE 2D cross-section (journal bore + lead-in slot + 45-deg swing ramp),
//     CAPPED at the recessed lid top (LID_TOP_Z), swept along the wall. At BOTH ends the whole
//     profile RUNS OUT smoothly -- it tapers to the inner-top rim corner (HINGE_INX, BODY_H) --
//     so there is NO end-face and NO exposed bore at the corners; the groove just fades into the
//     wall. The rim caps the bullnose (retains the lid, tilt-in); the 45-deg ramp is self-
//     supporting and gives the swing clearance; the cap stays full over the bullnose => retains.
module groove_profile() {                            // 2D cross-section in (x, z)
    union() {
        translate([POCKET_CX, POCKET_CZ]) circle(r = GROOVE_POCKET_R, $fn = 28);              // journal bore
        translate([POCKET_CX, LID_Z_UNDER]) square([HINGE_INX - POCKET_CX + EPS, LID_T]);     // lead-in slot
        polygon([[POCKET_CX, LID_TOP_Z], [HINGE_INX + EPS, LID_TOP_Z], [HINGE_INX + EPS, BODY_H - CHAMFER]]); // swing relief (below the rim chamfer)
        polygon([[HINGE_INX, BODY_H - CHAMFER], [HINGE_INX + EPS, BODY_H + EPS], [HINGE_INX - CHAMFER, BODY_H + EPS]]); // rim chamfer cut, CONTINUOUS through the divider junctions (no bulge)
    }
}
module groove_extrude(y0, y1) {                      // sweep the profile along the wall, y0..y1
    translate([0, y0, 0]) rotate([90,0,0]) translate([0,0,-(y1 - y0)]) linear_extrude(y1 - y0) groove_profile();
}
module hinge_groove() {
    // journal runs STRAIGHT to the end of the wall at each side; the perpendicular short wall
    // caps the bore there (no run-out). The EPS overlap tucks the bore end into the short wall.
    groove_extrude(INTERIOR_Y0 - EPS, INTERIOR_Y1 + EPS);
}

// --- lower the inner chamber dividers to the lid underside (mid-support, no sag).
//     Removes the divider top over the full length; outer walls keep full height.
module divider_lower() {
    // x-span is the CHAMBER BAY only [BAY_X0, BAY_X1] (+EPS overlap into the end walls so the
    // cut is manifold). The end/outer walls keep their full BODY_H tops; only the two INNER
    // dividers (DIV_KF, DIV_FS) are lowered.
    translate([BAY_X0 - EPS, DIV_KF[0], LID_Z_UNDER]) cube([BAY_X1 - BAY_X0 + 2*EPS, HOST_T, BODY_H - LID_Z_UNDER + CUT_OVER]);
    translate([BAY_X0 - EPS, DIV_FS[0], LID_Z_UNDER]) cube([BAY_X1 - BAY_X0 + 2*EPS, HOST_T, BODY_H - LID_Z_UNDER + CUT_OVER]);
}

// --- retaining clips (ADDED): TWO light detent lips on the clip end wall, flanking the finger
//     notch. Each lip overhangs the RECESSED lid top (LID_TOP_Z) by CLIP_LIP and gives a soft
//     hold; a lead-in ramp above it cams the lid under on close. Anchored into the wall. Light
//     enough that lifting the lid edge (through the notch) flexes the sheet past both at once.
CLIP_OFF = NOTCH_W/2 + CLIP_W/2;     // clip centre offset from CLIP_CY (clips sit just outside the notch)
module one_clip(yc) {
    translate([0, yc - CLIP_W/2, 0]) rotate([90,0,0]) translate([0,0,-CLIP_W]) linear_extrude(CLIP_W)
        polygon([[CLIP_INX - CLIP_IN*HOST_T/2, LID_TOP_Z - 0.8],         // anchor low, into the wall (fuse)
                 [CLIP_INX + CLIP_IN*CLIP_LIP, LID_TOP_Z],               // lip tip: overhang over the lid top
                 [CLIP_INX + CLIP_IN*CLIP_LIP, LID_TOP_Z + 0.4],         // lip front
                 [CLIP_INX - CLIP_IN*HOST_T/2, LID_TOP_Z + CLIP_RAMP_H]]);// lead-in ramp up into the wall
}
module lid_clip() {
    one_clip(CLIP_CY - CLIP_OFF);
    one_clip(CLIP_CY + CLIP_OFF);
}

// --- finger notch (CUT): a through-cut in the clip end wall, centred between the two clips.
//     Vertical sides + an ELLIPTICAL arched bottom (a rounded scoop, not a sharp box). Goes
//     THROUGH the wall so it reads as a visible scoop from the outside and a fingertip can
//     reach the lid edge to lift it. Deepest point is NOTCH_DEPTH below the rim.
module lid_finger_notch() {
    arch_cz = BODY_H - NOTCH_DEPTH + NOTCH_ARCH;          // z where the vertical sides meet the arc
    // vertical-sided upper part, open to the rim
    translate([CLIP_INX - EPS, CLIP_CY - NOTCH_W/2, arch_cz - EPS])
        cube([END_WALL + 2*EPS, NOTCH_W, (BODY_H + EPS) - (arch_cz - EPS)]);
    // elliptical arched bottom (y-semi = NOTCH_W/2, z-semi = NOTCH_ARCH), through the wall
    translate([CLIP_INX - EPS, CLIP_CY, arch_cz])
        scale([1, 1, NOTCH_ARCH/(NOTCH_W/2)])
        rotate([0, 90, 0])
        cylinder(h = END_WALL + 2*EPS, r = NOTCH_W/2, $fn = 48);
    // ALSO remove the support ledge across the notch span, so a fingertip can reach under the
    // lid edge here (the ledge/rail stays everywhere else to keep pinching the lid with the clips)
    lx0 = min(CLIP_INX, CLIP_INX + CLIP_IN*LEDGE_W) - EPS;
    lx1 = max(CLIP_INX, CLIP_INX + CLIP_IN*LEDGE_W) + EPS;
    translate([lx0, CLIP_CY - NOTCH_W/2, LID_Z_UNDER - LEDGE_W - EPS])
        cube([lx1 - lx0, NOTCH_W, LEDGE_W + 2*EPS]);
}

// --- restore the inner-top rim chamfer where the LOWERED dividers meet the +x (clip) end wall.
//     The box chamfer is interrupted at those junctions (the divider fills the inner side before
//     it is lowered), leaving a full-height bulge once lowered. The -x/hinge side is already
//     handled by the continuous journal chamfer; this does the same at the +x end.
module div_chamfer_fix() {
    cz = BODY_H - CHAMFER;            // 57, chamfer base
    xf = TOTAL_LEN - END_WALL;        // 202, +x clip-wall inner face
    for (yb = [DIV_KF, DIV_FS])
        translate([0, yb[0] - EPS, 0]) rotate([90,0,0]) translate([0,0,-((yb[1]-yb[0])+2*EPS)]) linear_extrude((yb[1]-yb[0])+2*EPS)
            polygon([[xf, cz], [xf - EPS, BODY_H + EPS], [xf + CHAMFER, BODY_H + EPS]]);  // bevel toward the wall (x>202)
}

// ============================================================================
// The six pieces.  piece = intersection(box, cell + own male keys) - own sockets
//   A halves are MALE on the A/B seam (keep the key); B halves are FEMALE (slot).
//   On a chamber seam the LEFT chamber is male (+Y), the right chamber is female.
// ============================================================================
// Base half-lap shingling (FEMALE-first, Option 1):
//   A/B seam  -> the B half owns the bottom shelf (grows -X), A has the negative.
//   chamber   -> the UPPER chamber (fork, spoon) owns the shelf (grows -Y); the
//                lower chamber (knife, fork) has the negative.
//   Assembly order: spoon, fork, knife; B before A (male lowered onto female).
// Center crossings (104,81)&(104,186): the CHAMBER shelf (fork_A / spoon_A) owns the
//   crossing square; the B-half A/B shelf (knife_B / fork_B) is CLIPPED short of the
//   chamber seam by LAP_LEN so two shelves never collide.
module knife_A() {                                       // placed LAST; receives everything
  union() {                                               // + corner key (added after the cuts)
    difference() {
        union() {
            intersection() {
                box();
                union() {
                    cell(-1, AB_SEAM, KNIFE_Y0 - 1, KNIFE_Y1);
                    ab_key(YC_OUTL); ab_key(YC_DIVKF); ch_key(SEAM_KF, ENDC_A);
                    ab_cap(YC_OUTL); div_cap(YC_DIVKF); ch_cap(SEAM_KF, ENDC_A);  // hide tops (divider uses LOWERED hat)
                }
            }
            intersection() { lid_ledge(); cell(-1, AB_SEAM, KNIFE_Y0 - 1, KNIFE_Y1); }  // lid support ledge
        }
        lap_neg_X(KNIFE_Y0, KNIFE_Y1);            // receive knife_B's A/B shelf
        lap_neg_Y(SEAM_KF, 0, AB_SEAM);           // receive fork_A's chamber shelf
        hinge_groove(); divider_lower(); lid_finger_notch(); div_chamfer_fix();   // lid cuts (groove hits A pieces; divider/scallop where present)
    }
    corner_key(AB_SEAM, LAP_LEN, SEAM_KF - LAP_LEN, SEAM_KF);  // solid full-height corner under the knife/fork divider
  }
}

module knife_B() {
    difference() {
        union() {
            intersection() {
                box();
                union() {
                    cell(AB_SEAM, TOTAL_LEN + 1, KNIFE_Y0 - 1, KNIFE_Y1);
                    ch_key(SEAM_KF, ENDC_B);
                    ch_cap(SEAM_KF, ENDC_B);                // hide top (male, chamber)
                }
            }
            lap_shelf_X(KNIFE_Y0, KNIFE_Y1 - LAP_LEN);  // A/B shelf -> knife_A (CLIPPED at y=81 crossing)
            intersection() { lid_ledge(); cell(AB_SEAM, TOTAL_LEN + 1, KNIFE_Y0 - 1, KNIFE_Y1); }  // lid support ledge
        }
        ab_socket(YC_OUTL); ab_socket(YC_DIVKF);
        ab_cap_neg(YC_OUTL); div_cap_neg(YC_DIVKF);      // top recesses to receive knife_A's caps (divider = LOWERED hat)
        lap_neg_Y(SEAM_KF, AB_SEAM, TOTAL_LEN);         // receive fork_B's chamber shelf
        hinge_groove(); divider_lower(); lid_finger_notch(); div_chamfer_fix();   // lid cuts
    }
}

module fork_A() {
  union() {                                               // + corner key (added after the cuts)
    difference() {
        union() {
            intersection() {
                box();
                union() {
                    cell(-1, AB_SEAM, FORK_Y0 + SEAM_EPS, FORK_Y1);  // -Y cut nudged off the divider face
                    ab_key(YC_DIVFS); ch_key(SEAM_FS, ENDC_A);
                    div_cap(YC_DIVFS); ch_cap(SEAM_FS, ENDC_A);       // hide tops (divider uses LOWERED hat)
                }
            }
            lap_shelf_Y(SEAM_KF, 0, AB_SEAM - CORNER_CLIP);  // chamber shelf -> knife_A, CLIPPED (knife_A now owns the crossing as a solid corner)
            intersection() { lid_ledge(); cell(-1, AB_SEAM, FORK_Y0 + SEAM_EPS, FORK_Y1); }  // lid support ledge (none in fork-A)
        }
        lap_neg_X(FORK_Y0, FORK_Y1);                    // receive fork_B's A/B shelf
        ch_socket(SEAM_KF, ENDC_A);
        ch_cap_neg(SEAM_KF, ENDC_A);                    // top recess to receive knife_A's chamber cap (female)
        lap_neg_Y(SEAM_FS, 0, AB_SEAM, LAP_LEN_FS);     // receive spoon_A's (small) chamber shelf
        hinge_groove(); divider_lower(); lid_finger_notch(); div_chamfer_fix();   // lid cuts (groove = fork-A hinge segment; divider = DIV_FS)
    }
    corner_key(AB_SEAM, LAP_LEN, SEAM_FS - LAP_LEN_FS, SEAM_FS);  // solid full-height corner under the fork/spoon divider
  }
}

module fork_B() {
    union() {
        difference() {
            union() {
                intersection() {
                    box();
                    union() {
                        cell(AB_SEAM, TOTAL_LEN + 1, FORK_Y0 + SEAM_EPS, FORK_Y1);  // -Y cut nudged off the divider face
                        ch_key(SEAM_FS, ENDC_B);
                        ch_cap(SEAM_FS, ENDC_B);                // hide top (male, chamber)
                    }
                }
                lap_shelf_X(FORK_Y0, FORK_Y1 - LAP_LEN_FS); // A/B shelf -> fork_A (CLIPPED at y=186 crossing)
                lap_shelf_Y(SEAM_KF, AB_SEAM, TOTAL_LEN);   // chamber shelf -> knife_B
                intersection() { lid_ledge(); cell(AB_SEAM, TOTAL_LEN + 1, FORK_Y0 + SEAM_EPS, FORK_Y1); }  // lid ledge (clip-end run)
            }
            ab_socket(YC_DIVFS);
            div_cap_neg(YC_DIVFS);                           // top recess to receive fork_A's A/B cap (divider = LOWERED hat)
            ch_socket(SEAM_KF, ENDC_B);
            ch_cap_neg(SEAM_KF, ENDC_B);                    // top recess to receive knife_B's chamber cap (female)
            lap_neg_Y(SEAM_FS, AB_SEAM, TOTAL_LEN, LAP_LEN_FS); // receive spoon_B's (small) chamber shelf
            hinge_groove(); divider_lower(); lid_finger_notch(); div_chamfer_fix();     // lid cuts (scallop lands here)
        }
        intersection() { lid_clip(); cell(AB_SEAM, TOTAL_LEN + 1, FORK_Y0 + SEAM_EPS, FORK_Y1); }  // retaining clip, added AFTER the scallop cut
    }
}

module spoon_A() {
    difference() {
        union() {
            intersection() {
                box();
                union() {
                    cell(-1, AB_SEAM, SPOON_Y0 + SEAM_EPS, SPOON_Y1 + 1);  // -Y cut nudged off the divider face
                    ab_key(YC_OUTR);
                    ab_cap(YC_OUTR);                        // hide top (male)
                }
            }
            lap_shelf_Y(SEAM_FS, 0, AB_SEAM - CORNER_CLIP, LAP_LEN_FS); // chamber shelf -> fork_A, CLIPPED (fork_A now owns the crossing as a solid corner)
            intersection() { lid_ledge(); cell(-1, AB_SEAM, SPOON_Y0 + SEAM_EPS, SPOON_Y1 + 1); }  // lid support ledge (OUTER_R run)
        }
        lap_neg_X(SPOON_Y0, SPOON_Y1);                  // receive spoon_B's A/B shelf
        ch_socket(SEAM_FS, ENDC_A);
        ch_cap_neg(SEAM_FS, ENDC_A);                    // top recess to receive fork_A's chamber cap (female)
        hinge_groove(); divider_lower(); lid_finger_notch(); div_chamfer_fix();   // lid cuts (groove = spoon-A hinge segment)
    }
}

module spoon_B() {                                      // placed FIRST; owns shelves
    difference() {
        union() {
            intersection() {
                box();
                union() {
                    cell(AB_SEAM, TOTAL_LEN + 1, SPOON_Y0 + SEAM_EPS, SPOON_Y1 + 1);  // -Y cut nudged off the divider face
                }
            }
            lap_shelf_X(SPOON_Y0, SPOON_Y1);            // A/B shelf -> spoon_A
            lap_shelf_Y(SEAM_FS, AB_SEAM, TOTAL_LEN, LAP_LEN_FS); // chamber shelf -> fork_B (small)
            intersection() { lid_ledge(); cell(AB_SEAM, TOTAL_LEN + 1, SPOON_Y0 + SEAM_EPS, SPOON_Y1 + 1); }  // lid ledge (OUTER_R + clip-end runs)
        }
        ab_socket(YC_OUTR);
        ab_cap_neg(YC_OUTR);                            // top recess to receive spoon_A's A/B cap (female)
        ch_socket(SEAM_FS, ENDC_B);
        ch_cap_neg(SEAM_FS, ENDC_B);                    // top recess to receive fork_B's chamber cap (female)
        hinge_groove(); divider_lower(); lid_finger_notch(); div_chamfer_fix();   // lid cuts
    }
}

// TRUE assembled view: the six real, separable pieces in their assembled positions
// (slower to render — many booleans — but this is what actually shows the seams, the
// lowered dividers, the hinge journal, the clip, the scallop, and all the joints).
// For a fast no-cuts preview of just the outer shell, temporarily use box(); instead.
module assembly() {
    knife_A(); knife_B(); fork_A(); fork_B(); spoon_A(); spoon_B();
}

// ============================================================================
// Render dispatch
// ============================================================================
if      (part == "knife_A")  knife_A();
else if (part == "knife_B")  knife_B();
else if (part == "fork_A")   fork_A();
else if (part == "fork_B")   fork_B();
else if (part == "spoon_A")  spoon_A();
else if (part == "spoon_B")  spoon_B();
else if (part == "assembly") assembly();
else echo(str("Unknown part: ", part));
